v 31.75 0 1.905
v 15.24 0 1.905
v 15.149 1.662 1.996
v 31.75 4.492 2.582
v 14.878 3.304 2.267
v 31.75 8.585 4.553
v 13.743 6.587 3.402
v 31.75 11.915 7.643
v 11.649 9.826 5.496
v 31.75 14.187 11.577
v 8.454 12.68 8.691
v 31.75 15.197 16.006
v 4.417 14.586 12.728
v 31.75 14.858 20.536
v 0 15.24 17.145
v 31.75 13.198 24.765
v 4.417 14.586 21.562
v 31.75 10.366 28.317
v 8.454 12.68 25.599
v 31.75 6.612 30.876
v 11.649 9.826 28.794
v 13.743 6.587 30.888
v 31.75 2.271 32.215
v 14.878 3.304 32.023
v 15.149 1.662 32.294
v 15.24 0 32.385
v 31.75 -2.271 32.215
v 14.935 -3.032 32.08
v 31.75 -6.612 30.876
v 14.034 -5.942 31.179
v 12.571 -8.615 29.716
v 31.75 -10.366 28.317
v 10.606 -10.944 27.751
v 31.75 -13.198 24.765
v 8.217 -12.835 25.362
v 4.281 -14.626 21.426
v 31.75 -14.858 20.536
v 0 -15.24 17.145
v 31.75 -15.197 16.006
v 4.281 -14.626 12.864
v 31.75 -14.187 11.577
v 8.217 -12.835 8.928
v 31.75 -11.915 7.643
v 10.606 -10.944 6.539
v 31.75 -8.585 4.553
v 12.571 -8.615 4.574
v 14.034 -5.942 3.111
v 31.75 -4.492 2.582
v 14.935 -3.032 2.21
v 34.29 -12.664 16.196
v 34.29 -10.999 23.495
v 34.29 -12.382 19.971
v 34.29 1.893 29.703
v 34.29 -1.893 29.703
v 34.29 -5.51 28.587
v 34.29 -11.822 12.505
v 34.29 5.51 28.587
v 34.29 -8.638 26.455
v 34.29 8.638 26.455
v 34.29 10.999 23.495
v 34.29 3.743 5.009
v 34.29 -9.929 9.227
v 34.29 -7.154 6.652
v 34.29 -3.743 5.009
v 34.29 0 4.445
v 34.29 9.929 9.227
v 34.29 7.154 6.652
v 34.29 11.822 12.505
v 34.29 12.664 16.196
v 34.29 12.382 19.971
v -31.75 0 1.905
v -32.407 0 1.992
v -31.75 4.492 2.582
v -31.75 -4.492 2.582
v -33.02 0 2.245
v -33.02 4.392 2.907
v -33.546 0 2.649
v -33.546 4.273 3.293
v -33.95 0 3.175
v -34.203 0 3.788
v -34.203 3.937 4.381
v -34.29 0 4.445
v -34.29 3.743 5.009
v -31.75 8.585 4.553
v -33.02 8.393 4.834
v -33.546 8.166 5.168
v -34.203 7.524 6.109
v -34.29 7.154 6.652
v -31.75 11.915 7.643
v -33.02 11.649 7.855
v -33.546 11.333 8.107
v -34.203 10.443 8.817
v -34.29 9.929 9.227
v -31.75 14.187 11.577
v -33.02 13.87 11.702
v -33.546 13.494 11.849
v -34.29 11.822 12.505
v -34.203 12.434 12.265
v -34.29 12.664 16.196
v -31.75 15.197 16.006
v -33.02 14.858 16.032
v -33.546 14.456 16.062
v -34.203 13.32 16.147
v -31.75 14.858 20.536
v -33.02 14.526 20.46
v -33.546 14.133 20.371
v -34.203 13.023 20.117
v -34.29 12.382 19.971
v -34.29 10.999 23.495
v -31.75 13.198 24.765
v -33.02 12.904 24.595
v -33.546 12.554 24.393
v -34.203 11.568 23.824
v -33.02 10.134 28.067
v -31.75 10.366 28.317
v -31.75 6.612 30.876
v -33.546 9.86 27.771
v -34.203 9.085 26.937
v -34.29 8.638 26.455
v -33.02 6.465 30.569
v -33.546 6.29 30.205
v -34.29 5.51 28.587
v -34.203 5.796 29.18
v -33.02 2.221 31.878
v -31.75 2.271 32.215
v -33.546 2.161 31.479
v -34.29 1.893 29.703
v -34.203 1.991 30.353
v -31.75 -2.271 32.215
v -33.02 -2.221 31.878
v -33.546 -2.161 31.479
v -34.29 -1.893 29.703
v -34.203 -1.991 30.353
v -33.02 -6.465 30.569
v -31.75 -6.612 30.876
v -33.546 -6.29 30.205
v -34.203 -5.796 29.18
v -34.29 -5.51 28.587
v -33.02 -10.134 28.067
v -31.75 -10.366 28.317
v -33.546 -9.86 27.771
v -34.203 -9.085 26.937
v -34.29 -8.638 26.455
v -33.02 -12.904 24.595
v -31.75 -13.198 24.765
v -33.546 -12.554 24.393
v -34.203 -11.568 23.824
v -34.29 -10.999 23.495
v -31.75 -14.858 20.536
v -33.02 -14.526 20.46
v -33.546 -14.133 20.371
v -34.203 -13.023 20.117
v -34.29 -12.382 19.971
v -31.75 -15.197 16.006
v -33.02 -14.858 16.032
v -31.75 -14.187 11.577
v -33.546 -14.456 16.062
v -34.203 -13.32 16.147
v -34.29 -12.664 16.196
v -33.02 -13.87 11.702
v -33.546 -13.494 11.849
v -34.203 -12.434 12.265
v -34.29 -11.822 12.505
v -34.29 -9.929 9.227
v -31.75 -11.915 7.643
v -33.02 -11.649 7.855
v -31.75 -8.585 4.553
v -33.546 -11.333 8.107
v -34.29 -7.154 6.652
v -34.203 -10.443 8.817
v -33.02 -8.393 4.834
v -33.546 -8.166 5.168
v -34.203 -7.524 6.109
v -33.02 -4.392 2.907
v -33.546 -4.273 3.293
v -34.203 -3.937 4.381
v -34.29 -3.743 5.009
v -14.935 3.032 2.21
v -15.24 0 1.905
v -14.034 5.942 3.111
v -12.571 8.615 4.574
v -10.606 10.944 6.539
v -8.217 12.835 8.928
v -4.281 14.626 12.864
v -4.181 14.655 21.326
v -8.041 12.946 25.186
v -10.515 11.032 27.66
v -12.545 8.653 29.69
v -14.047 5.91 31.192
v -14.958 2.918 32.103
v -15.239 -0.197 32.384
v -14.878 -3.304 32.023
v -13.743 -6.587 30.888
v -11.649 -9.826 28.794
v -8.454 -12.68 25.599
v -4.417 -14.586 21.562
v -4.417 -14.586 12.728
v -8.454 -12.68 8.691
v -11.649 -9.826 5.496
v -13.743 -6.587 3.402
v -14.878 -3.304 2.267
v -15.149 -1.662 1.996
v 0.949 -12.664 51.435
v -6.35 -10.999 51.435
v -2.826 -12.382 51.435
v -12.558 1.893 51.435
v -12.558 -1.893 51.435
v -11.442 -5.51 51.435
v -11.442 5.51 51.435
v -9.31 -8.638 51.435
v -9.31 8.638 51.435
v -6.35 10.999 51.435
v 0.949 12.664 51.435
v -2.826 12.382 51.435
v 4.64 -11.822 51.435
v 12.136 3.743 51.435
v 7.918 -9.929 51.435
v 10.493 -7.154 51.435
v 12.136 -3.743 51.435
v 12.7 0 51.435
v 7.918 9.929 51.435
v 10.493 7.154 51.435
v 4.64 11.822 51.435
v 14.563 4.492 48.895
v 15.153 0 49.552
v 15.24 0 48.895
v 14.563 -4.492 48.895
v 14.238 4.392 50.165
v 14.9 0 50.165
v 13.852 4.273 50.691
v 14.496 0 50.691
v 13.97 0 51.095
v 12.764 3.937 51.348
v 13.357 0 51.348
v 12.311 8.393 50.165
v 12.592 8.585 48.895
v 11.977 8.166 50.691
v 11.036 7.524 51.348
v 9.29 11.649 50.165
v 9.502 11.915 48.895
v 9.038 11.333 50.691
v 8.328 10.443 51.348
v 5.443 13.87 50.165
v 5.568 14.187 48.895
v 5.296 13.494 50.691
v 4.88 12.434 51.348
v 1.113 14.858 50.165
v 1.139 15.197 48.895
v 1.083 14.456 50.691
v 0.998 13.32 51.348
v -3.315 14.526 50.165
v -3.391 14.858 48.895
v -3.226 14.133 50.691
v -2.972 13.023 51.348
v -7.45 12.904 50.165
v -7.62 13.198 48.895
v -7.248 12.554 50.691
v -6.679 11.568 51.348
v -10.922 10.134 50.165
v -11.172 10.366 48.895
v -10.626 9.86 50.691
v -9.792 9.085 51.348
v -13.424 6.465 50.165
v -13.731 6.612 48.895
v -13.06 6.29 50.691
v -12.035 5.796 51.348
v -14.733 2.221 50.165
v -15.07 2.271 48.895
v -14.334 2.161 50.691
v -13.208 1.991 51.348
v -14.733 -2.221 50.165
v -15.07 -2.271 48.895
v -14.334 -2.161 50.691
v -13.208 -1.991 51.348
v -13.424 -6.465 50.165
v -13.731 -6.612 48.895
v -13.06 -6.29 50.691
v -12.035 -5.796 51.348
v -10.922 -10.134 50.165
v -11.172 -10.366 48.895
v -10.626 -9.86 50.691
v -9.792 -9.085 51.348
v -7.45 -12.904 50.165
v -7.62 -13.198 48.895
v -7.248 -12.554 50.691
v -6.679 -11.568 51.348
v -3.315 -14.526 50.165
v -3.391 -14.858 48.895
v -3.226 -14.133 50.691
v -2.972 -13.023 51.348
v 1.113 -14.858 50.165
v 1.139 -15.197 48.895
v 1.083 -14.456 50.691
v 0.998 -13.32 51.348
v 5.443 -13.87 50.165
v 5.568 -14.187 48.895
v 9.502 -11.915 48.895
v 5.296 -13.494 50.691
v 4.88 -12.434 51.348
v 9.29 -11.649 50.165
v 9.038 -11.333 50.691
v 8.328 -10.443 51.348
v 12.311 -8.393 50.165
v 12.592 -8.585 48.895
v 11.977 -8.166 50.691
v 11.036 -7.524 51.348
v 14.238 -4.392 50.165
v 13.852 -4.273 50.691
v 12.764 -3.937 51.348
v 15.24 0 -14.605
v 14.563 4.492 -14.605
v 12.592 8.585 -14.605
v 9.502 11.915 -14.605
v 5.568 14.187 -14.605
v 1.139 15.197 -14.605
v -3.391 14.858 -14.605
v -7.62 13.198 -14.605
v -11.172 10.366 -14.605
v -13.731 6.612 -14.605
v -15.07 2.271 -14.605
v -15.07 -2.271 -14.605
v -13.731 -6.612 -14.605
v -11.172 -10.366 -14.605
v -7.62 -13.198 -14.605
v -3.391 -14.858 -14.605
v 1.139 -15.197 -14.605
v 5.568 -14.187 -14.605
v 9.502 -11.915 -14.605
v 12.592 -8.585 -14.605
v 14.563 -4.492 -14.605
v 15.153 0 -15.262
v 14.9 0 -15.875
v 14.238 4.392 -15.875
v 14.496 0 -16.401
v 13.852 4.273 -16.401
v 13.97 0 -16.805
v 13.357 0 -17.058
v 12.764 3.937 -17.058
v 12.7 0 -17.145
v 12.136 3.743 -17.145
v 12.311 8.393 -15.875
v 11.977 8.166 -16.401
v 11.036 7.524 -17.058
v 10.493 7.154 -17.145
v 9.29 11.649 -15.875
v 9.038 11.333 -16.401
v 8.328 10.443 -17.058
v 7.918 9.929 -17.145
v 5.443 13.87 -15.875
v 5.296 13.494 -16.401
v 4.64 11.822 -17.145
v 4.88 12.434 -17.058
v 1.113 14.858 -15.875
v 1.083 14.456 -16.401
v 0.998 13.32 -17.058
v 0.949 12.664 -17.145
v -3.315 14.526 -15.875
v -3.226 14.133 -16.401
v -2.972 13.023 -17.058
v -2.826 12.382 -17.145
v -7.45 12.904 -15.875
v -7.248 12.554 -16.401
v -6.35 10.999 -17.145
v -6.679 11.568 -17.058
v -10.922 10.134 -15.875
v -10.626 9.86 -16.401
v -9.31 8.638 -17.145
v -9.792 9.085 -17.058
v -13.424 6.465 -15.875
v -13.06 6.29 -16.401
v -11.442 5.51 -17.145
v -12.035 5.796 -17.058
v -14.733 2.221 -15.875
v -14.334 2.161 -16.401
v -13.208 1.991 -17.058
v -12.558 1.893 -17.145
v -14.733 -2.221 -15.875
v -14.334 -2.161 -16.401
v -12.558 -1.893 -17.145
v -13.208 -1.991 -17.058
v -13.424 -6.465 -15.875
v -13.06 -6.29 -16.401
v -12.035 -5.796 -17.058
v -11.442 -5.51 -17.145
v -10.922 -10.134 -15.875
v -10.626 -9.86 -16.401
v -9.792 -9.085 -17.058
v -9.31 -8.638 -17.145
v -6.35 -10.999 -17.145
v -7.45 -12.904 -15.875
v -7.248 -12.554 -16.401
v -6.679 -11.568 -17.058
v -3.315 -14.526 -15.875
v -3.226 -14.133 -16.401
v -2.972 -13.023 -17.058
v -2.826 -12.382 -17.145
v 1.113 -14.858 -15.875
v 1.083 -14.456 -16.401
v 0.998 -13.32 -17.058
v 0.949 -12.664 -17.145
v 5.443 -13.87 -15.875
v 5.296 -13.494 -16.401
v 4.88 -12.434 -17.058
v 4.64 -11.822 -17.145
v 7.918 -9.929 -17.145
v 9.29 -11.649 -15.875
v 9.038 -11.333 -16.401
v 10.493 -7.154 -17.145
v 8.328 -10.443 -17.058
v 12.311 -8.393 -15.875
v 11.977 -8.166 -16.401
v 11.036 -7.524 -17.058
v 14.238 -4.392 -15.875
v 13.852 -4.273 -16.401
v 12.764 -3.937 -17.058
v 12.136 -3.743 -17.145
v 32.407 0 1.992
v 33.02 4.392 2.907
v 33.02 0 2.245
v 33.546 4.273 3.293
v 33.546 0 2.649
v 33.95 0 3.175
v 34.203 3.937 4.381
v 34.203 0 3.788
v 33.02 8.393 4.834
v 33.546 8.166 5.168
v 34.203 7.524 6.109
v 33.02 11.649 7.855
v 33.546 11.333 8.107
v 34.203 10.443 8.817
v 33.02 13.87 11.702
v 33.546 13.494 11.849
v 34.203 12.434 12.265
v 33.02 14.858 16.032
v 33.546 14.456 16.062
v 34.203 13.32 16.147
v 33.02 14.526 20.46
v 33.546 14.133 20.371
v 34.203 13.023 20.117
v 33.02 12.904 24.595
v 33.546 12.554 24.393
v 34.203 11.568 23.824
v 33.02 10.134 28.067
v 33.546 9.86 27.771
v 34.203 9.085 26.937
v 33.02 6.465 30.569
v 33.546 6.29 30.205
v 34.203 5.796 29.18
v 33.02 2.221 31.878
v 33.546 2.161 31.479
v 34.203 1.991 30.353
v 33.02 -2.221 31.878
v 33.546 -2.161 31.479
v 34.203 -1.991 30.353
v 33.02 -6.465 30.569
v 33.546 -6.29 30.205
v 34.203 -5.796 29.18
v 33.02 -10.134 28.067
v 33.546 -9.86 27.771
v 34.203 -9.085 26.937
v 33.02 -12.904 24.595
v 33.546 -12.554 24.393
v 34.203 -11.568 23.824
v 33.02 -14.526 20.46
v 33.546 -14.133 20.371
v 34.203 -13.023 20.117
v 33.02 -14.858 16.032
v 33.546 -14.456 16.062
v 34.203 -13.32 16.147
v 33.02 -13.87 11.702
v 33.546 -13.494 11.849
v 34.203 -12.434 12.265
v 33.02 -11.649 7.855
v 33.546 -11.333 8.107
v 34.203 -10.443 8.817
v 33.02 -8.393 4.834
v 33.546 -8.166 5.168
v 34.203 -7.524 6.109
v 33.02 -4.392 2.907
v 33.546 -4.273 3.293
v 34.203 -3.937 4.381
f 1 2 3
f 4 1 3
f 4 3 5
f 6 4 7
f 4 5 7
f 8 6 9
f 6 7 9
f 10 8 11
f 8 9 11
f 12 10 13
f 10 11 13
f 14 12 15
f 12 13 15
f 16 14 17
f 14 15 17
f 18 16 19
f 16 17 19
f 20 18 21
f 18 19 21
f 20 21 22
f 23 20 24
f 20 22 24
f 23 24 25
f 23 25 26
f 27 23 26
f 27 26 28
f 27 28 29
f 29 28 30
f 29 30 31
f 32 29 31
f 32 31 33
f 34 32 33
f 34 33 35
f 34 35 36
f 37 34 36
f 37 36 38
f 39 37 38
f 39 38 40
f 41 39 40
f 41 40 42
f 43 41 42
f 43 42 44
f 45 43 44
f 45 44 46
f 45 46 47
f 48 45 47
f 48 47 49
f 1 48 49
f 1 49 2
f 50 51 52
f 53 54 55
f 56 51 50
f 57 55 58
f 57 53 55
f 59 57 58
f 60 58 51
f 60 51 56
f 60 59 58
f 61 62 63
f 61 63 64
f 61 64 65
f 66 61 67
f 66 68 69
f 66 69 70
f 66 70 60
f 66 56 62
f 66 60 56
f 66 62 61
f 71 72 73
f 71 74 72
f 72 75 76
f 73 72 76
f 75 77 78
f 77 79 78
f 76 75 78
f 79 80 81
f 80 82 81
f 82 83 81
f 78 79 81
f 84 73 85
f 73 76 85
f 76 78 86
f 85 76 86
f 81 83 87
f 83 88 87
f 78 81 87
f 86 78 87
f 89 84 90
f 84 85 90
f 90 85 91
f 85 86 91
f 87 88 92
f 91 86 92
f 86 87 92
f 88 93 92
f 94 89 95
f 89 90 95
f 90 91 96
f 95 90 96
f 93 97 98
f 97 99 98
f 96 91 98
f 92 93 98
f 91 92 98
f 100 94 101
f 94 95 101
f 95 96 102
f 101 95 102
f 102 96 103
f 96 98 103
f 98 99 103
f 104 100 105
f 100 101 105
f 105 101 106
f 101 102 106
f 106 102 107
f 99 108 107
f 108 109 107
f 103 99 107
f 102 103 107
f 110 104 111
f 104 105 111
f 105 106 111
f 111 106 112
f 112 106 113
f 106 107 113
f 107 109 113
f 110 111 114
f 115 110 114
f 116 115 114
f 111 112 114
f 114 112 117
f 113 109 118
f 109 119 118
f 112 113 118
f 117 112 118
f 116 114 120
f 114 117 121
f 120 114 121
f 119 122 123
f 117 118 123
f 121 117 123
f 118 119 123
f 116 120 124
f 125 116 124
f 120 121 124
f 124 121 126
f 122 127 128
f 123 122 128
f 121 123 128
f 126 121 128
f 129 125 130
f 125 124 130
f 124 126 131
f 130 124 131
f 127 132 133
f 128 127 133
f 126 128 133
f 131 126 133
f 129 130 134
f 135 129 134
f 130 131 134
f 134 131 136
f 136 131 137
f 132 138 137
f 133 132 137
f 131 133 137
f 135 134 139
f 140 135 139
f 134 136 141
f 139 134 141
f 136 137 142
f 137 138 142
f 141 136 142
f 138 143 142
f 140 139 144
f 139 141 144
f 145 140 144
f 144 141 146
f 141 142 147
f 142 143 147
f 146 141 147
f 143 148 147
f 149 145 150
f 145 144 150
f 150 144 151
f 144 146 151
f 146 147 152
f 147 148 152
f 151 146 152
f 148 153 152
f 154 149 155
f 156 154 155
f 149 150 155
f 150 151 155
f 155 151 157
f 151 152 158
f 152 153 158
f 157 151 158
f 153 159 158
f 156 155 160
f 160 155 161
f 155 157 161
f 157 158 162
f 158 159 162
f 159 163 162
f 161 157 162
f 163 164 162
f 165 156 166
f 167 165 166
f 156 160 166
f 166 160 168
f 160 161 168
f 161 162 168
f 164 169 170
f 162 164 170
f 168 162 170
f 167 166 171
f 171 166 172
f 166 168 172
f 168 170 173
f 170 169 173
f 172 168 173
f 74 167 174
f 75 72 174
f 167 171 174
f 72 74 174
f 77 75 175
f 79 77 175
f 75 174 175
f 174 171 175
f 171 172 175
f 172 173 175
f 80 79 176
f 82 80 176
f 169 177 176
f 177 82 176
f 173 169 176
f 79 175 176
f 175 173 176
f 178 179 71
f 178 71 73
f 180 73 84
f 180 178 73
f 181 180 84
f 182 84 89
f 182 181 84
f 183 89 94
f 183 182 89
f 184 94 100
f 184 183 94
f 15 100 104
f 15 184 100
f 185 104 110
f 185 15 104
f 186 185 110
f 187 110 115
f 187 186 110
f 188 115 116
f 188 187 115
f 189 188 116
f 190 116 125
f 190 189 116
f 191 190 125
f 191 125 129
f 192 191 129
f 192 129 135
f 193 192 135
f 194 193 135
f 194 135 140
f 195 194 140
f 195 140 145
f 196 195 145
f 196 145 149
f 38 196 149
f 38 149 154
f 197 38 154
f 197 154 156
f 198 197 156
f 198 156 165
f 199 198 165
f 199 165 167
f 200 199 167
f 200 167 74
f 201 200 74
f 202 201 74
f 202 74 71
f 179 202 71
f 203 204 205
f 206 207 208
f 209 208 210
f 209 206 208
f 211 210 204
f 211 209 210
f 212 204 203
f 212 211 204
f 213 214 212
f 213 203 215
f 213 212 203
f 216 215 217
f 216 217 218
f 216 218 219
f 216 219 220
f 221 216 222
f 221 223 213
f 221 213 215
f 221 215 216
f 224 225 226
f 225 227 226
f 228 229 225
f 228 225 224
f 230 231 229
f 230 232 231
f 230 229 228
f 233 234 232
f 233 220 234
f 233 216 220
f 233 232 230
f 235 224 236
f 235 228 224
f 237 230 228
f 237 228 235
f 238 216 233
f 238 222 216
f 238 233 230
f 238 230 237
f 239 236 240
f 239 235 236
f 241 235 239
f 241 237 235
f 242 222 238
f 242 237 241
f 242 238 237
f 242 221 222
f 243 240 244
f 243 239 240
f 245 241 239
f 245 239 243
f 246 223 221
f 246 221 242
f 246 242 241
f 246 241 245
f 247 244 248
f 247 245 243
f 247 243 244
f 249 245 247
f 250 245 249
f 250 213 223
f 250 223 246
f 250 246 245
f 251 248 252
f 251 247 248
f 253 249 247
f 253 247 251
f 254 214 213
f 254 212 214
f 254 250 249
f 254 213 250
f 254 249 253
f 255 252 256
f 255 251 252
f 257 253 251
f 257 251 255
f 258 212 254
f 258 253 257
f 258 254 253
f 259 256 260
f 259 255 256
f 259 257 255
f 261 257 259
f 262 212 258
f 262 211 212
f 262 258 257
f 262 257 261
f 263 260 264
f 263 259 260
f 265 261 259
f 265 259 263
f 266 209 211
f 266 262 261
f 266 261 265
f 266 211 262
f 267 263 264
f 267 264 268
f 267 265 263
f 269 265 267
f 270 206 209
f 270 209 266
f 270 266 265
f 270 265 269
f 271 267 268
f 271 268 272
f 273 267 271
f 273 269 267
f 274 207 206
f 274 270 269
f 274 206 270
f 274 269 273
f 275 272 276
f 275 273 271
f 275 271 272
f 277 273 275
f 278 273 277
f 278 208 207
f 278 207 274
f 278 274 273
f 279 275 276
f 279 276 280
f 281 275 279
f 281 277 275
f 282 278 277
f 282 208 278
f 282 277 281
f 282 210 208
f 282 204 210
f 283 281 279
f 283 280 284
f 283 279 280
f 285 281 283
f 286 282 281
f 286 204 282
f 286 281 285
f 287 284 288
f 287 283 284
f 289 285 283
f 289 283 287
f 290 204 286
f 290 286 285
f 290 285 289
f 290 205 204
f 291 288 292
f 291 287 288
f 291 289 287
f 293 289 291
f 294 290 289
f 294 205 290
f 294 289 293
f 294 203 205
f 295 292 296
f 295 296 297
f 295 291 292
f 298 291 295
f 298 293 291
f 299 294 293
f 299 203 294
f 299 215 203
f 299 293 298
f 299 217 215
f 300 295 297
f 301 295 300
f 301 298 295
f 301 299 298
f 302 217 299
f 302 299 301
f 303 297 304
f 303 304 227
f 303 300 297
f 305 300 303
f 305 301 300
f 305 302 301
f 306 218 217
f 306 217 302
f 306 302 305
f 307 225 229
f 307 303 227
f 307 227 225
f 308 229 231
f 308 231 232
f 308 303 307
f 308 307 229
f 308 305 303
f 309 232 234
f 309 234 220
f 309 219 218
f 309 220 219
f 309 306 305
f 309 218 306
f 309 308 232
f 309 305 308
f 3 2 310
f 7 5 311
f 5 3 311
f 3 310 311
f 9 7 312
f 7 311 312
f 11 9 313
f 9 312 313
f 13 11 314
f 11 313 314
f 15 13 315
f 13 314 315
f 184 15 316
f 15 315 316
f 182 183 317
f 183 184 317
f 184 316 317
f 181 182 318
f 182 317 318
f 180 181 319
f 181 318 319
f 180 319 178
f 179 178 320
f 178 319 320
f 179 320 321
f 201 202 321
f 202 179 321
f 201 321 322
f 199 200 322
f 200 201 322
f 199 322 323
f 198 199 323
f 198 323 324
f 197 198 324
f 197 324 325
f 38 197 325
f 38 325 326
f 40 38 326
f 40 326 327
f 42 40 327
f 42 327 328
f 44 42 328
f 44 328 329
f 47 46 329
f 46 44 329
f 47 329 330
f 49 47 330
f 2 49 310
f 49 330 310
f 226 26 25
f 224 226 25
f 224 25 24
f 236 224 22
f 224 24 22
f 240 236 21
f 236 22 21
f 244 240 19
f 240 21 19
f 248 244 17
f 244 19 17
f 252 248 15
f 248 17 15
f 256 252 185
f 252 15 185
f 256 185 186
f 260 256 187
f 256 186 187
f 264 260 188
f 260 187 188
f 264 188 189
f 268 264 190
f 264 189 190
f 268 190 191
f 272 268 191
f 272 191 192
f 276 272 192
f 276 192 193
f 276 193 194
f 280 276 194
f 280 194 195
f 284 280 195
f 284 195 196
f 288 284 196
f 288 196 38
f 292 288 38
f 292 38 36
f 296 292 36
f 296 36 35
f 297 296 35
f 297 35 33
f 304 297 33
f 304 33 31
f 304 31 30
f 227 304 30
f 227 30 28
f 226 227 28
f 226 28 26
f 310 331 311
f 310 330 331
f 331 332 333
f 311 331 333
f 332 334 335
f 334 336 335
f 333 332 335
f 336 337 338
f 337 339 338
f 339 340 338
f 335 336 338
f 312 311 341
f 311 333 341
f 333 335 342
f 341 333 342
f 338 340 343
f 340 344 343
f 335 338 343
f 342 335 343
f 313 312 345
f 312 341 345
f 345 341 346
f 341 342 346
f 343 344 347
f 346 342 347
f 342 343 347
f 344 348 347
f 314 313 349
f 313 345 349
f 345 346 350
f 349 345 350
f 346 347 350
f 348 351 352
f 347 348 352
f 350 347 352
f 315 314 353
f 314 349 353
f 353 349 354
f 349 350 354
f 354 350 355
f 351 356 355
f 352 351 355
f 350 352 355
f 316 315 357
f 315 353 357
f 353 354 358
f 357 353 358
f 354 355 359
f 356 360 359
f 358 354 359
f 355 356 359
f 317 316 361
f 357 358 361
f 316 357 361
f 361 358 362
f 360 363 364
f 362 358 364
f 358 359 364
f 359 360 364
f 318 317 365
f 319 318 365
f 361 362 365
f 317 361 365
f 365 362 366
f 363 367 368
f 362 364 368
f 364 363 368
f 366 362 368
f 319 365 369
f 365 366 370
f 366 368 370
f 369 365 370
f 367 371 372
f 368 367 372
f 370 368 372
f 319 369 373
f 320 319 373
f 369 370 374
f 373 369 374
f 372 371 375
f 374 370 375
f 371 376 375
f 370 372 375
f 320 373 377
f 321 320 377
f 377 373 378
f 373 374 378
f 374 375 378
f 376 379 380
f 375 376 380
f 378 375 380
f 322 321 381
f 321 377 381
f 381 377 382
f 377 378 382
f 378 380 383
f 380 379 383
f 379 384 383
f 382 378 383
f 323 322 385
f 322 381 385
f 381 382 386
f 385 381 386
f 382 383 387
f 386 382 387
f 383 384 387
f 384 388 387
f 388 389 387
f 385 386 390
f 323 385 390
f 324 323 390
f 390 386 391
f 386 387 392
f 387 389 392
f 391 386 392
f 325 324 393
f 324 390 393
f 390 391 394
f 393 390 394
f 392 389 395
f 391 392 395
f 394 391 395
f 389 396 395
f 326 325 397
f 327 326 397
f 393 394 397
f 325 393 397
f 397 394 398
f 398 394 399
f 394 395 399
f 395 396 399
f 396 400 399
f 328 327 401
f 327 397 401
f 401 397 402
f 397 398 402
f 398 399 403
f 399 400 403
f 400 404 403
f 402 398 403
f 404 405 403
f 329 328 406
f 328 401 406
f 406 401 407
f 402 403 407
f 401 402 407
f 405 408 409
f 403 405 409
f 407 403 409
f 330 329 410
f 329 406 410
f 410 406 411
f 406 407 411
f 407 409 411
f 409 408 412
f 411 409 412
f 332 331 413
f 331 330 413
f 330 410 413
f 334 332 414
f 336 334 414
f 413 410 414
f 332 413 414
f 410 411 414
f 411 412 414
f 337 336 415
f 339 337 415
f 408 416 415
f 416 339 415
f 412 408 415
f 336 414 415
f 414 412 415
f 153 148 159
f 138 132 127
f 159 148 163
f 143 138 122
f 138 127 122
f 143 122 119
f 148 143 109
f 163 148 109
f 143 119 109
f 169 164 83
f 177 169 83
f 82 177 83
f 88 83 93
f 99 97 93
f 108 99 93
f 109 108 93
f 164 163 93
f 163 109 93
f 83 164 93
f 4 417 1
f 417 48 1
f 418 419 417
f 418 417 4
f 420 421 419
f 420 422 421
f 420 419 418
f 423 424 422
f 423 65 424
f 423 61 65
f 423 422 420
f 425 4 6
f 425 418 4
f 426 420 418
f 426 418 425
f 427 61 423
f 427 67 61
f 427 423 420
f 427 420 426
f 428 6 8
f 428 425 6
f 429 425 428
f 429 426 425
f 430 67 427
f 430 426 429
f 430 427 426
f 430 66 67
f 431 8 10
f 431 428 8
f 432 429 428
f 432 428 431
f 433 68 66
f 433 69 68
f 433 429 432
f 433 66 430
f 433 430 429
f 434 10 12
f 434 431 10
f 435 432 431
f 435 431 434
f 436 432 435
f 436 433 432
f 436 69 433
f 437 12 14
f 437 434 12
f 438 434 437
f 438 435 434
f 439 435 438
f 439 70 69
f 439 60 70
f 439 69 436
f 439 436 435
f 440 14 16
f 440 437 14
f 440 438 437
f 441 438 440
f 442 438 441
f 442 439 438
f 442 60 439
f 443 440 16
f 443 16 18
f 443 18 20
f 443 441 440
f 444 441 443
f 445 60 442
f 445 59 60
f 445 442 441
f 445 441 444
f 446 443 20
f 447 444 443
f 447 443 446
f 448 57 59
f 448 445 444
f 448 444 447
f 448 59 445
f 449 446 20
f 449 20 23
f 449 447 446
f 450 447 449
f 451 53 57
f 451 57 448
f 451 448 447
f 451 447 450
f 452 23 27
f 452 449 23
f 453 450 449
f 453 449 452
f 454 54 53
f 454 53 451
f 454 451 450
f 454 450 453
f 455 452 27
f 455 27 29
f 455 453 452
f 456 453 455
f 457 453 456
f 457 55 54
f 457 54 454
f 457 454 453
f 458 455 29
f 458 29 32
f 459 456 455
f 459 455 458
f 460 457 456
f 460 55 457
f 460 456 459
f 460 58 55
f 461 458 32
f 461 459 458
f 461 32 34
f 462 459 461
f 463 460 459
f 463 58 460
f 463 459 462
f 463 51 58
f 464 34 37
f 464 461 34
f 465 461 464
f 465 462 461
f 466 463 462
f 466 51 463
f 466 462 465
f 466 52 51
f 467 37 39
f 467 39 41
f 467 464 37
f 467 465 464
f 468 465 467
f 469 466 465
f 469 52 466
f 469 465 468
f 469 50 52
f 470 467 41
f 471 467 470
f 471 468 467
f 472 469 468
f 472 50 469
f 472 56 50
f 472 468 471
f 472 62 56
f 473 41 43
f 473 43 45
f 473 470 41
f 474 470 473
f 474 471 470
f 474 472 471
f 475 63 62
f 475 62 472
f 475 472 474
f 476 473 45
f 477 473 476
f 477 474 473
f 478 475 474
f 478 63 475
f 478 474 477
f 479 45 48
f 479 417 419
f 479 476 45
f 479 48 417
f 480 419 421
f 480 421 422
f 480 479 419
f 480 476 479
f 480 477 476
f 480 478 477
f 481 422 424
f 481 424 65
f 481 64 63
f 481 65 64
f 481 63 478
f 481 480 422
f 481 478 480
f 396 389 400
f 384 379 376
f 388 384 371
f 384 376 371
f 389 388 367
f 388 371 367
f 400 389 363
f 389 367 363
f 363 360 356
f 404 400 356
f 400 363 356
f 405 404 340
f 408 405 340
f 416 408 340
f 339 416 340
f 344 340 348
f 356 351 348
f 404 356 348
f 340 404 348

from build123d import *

# Parameters (mm, degrees)
SKETCH2_R                = 7.62
BOSS_EXTRUDE1_DEPTH      = 34.29
BOSS_EXTRUDE2_DEPTH      = 17.145
BOSS_EXTRUDE2_DEPTH_BACK = 17.145
SKETCH3_R                = 7.62
FILLET1_R                = 1.27
SCALE1_SCALE             = 2


with BuildPart() as part:
    # Sketch2 → Boss-Extrude1 (new body)
    with BuildSketch(Plane.XY):
        Circle(SKETCH2_R)
    extrude(amount=BOSS_EXTRUDE1_DEPTH)

    # Sketch3 → Boss-Extrude2 (add, two sides: drawn at the far end of the back side and taken through both)
    with BuildSketch(Plane(origin=(0, 0, 0), x_dir=(0, 0, -1), z_dir=(1, 0, 0)).offset(-BOSS_EXTRUDE2_DEPTH_BACK)):
        with Locations((-17.145, 0)):
            Circle(SKETCH3_R)
    extrude(amount=BOSS_EXTRUDE2_DEPTH + BOSS_EXTRUDE2_DEPTH_BACK)

    # Fillet1
    fillet1_edges = [part.edges().sort_by_distance(p)[0] for p in [
        (-7.62, 0, 34.29),
        (17.145, 0, 24.765),
        (-17.145, 0, 24.765),
        (-7.62, 0, 0),
    ]]
    fillet(fillet1_edges, radius=FILLET1_R)


with BuildPart() as part_1:
    # Scale1: scaled about (0, 0, 17.145)
    add(part.part.scale(SCALE1_SCALE).moved(Location((0, 0, -17.145))))


solid = part_1.part
